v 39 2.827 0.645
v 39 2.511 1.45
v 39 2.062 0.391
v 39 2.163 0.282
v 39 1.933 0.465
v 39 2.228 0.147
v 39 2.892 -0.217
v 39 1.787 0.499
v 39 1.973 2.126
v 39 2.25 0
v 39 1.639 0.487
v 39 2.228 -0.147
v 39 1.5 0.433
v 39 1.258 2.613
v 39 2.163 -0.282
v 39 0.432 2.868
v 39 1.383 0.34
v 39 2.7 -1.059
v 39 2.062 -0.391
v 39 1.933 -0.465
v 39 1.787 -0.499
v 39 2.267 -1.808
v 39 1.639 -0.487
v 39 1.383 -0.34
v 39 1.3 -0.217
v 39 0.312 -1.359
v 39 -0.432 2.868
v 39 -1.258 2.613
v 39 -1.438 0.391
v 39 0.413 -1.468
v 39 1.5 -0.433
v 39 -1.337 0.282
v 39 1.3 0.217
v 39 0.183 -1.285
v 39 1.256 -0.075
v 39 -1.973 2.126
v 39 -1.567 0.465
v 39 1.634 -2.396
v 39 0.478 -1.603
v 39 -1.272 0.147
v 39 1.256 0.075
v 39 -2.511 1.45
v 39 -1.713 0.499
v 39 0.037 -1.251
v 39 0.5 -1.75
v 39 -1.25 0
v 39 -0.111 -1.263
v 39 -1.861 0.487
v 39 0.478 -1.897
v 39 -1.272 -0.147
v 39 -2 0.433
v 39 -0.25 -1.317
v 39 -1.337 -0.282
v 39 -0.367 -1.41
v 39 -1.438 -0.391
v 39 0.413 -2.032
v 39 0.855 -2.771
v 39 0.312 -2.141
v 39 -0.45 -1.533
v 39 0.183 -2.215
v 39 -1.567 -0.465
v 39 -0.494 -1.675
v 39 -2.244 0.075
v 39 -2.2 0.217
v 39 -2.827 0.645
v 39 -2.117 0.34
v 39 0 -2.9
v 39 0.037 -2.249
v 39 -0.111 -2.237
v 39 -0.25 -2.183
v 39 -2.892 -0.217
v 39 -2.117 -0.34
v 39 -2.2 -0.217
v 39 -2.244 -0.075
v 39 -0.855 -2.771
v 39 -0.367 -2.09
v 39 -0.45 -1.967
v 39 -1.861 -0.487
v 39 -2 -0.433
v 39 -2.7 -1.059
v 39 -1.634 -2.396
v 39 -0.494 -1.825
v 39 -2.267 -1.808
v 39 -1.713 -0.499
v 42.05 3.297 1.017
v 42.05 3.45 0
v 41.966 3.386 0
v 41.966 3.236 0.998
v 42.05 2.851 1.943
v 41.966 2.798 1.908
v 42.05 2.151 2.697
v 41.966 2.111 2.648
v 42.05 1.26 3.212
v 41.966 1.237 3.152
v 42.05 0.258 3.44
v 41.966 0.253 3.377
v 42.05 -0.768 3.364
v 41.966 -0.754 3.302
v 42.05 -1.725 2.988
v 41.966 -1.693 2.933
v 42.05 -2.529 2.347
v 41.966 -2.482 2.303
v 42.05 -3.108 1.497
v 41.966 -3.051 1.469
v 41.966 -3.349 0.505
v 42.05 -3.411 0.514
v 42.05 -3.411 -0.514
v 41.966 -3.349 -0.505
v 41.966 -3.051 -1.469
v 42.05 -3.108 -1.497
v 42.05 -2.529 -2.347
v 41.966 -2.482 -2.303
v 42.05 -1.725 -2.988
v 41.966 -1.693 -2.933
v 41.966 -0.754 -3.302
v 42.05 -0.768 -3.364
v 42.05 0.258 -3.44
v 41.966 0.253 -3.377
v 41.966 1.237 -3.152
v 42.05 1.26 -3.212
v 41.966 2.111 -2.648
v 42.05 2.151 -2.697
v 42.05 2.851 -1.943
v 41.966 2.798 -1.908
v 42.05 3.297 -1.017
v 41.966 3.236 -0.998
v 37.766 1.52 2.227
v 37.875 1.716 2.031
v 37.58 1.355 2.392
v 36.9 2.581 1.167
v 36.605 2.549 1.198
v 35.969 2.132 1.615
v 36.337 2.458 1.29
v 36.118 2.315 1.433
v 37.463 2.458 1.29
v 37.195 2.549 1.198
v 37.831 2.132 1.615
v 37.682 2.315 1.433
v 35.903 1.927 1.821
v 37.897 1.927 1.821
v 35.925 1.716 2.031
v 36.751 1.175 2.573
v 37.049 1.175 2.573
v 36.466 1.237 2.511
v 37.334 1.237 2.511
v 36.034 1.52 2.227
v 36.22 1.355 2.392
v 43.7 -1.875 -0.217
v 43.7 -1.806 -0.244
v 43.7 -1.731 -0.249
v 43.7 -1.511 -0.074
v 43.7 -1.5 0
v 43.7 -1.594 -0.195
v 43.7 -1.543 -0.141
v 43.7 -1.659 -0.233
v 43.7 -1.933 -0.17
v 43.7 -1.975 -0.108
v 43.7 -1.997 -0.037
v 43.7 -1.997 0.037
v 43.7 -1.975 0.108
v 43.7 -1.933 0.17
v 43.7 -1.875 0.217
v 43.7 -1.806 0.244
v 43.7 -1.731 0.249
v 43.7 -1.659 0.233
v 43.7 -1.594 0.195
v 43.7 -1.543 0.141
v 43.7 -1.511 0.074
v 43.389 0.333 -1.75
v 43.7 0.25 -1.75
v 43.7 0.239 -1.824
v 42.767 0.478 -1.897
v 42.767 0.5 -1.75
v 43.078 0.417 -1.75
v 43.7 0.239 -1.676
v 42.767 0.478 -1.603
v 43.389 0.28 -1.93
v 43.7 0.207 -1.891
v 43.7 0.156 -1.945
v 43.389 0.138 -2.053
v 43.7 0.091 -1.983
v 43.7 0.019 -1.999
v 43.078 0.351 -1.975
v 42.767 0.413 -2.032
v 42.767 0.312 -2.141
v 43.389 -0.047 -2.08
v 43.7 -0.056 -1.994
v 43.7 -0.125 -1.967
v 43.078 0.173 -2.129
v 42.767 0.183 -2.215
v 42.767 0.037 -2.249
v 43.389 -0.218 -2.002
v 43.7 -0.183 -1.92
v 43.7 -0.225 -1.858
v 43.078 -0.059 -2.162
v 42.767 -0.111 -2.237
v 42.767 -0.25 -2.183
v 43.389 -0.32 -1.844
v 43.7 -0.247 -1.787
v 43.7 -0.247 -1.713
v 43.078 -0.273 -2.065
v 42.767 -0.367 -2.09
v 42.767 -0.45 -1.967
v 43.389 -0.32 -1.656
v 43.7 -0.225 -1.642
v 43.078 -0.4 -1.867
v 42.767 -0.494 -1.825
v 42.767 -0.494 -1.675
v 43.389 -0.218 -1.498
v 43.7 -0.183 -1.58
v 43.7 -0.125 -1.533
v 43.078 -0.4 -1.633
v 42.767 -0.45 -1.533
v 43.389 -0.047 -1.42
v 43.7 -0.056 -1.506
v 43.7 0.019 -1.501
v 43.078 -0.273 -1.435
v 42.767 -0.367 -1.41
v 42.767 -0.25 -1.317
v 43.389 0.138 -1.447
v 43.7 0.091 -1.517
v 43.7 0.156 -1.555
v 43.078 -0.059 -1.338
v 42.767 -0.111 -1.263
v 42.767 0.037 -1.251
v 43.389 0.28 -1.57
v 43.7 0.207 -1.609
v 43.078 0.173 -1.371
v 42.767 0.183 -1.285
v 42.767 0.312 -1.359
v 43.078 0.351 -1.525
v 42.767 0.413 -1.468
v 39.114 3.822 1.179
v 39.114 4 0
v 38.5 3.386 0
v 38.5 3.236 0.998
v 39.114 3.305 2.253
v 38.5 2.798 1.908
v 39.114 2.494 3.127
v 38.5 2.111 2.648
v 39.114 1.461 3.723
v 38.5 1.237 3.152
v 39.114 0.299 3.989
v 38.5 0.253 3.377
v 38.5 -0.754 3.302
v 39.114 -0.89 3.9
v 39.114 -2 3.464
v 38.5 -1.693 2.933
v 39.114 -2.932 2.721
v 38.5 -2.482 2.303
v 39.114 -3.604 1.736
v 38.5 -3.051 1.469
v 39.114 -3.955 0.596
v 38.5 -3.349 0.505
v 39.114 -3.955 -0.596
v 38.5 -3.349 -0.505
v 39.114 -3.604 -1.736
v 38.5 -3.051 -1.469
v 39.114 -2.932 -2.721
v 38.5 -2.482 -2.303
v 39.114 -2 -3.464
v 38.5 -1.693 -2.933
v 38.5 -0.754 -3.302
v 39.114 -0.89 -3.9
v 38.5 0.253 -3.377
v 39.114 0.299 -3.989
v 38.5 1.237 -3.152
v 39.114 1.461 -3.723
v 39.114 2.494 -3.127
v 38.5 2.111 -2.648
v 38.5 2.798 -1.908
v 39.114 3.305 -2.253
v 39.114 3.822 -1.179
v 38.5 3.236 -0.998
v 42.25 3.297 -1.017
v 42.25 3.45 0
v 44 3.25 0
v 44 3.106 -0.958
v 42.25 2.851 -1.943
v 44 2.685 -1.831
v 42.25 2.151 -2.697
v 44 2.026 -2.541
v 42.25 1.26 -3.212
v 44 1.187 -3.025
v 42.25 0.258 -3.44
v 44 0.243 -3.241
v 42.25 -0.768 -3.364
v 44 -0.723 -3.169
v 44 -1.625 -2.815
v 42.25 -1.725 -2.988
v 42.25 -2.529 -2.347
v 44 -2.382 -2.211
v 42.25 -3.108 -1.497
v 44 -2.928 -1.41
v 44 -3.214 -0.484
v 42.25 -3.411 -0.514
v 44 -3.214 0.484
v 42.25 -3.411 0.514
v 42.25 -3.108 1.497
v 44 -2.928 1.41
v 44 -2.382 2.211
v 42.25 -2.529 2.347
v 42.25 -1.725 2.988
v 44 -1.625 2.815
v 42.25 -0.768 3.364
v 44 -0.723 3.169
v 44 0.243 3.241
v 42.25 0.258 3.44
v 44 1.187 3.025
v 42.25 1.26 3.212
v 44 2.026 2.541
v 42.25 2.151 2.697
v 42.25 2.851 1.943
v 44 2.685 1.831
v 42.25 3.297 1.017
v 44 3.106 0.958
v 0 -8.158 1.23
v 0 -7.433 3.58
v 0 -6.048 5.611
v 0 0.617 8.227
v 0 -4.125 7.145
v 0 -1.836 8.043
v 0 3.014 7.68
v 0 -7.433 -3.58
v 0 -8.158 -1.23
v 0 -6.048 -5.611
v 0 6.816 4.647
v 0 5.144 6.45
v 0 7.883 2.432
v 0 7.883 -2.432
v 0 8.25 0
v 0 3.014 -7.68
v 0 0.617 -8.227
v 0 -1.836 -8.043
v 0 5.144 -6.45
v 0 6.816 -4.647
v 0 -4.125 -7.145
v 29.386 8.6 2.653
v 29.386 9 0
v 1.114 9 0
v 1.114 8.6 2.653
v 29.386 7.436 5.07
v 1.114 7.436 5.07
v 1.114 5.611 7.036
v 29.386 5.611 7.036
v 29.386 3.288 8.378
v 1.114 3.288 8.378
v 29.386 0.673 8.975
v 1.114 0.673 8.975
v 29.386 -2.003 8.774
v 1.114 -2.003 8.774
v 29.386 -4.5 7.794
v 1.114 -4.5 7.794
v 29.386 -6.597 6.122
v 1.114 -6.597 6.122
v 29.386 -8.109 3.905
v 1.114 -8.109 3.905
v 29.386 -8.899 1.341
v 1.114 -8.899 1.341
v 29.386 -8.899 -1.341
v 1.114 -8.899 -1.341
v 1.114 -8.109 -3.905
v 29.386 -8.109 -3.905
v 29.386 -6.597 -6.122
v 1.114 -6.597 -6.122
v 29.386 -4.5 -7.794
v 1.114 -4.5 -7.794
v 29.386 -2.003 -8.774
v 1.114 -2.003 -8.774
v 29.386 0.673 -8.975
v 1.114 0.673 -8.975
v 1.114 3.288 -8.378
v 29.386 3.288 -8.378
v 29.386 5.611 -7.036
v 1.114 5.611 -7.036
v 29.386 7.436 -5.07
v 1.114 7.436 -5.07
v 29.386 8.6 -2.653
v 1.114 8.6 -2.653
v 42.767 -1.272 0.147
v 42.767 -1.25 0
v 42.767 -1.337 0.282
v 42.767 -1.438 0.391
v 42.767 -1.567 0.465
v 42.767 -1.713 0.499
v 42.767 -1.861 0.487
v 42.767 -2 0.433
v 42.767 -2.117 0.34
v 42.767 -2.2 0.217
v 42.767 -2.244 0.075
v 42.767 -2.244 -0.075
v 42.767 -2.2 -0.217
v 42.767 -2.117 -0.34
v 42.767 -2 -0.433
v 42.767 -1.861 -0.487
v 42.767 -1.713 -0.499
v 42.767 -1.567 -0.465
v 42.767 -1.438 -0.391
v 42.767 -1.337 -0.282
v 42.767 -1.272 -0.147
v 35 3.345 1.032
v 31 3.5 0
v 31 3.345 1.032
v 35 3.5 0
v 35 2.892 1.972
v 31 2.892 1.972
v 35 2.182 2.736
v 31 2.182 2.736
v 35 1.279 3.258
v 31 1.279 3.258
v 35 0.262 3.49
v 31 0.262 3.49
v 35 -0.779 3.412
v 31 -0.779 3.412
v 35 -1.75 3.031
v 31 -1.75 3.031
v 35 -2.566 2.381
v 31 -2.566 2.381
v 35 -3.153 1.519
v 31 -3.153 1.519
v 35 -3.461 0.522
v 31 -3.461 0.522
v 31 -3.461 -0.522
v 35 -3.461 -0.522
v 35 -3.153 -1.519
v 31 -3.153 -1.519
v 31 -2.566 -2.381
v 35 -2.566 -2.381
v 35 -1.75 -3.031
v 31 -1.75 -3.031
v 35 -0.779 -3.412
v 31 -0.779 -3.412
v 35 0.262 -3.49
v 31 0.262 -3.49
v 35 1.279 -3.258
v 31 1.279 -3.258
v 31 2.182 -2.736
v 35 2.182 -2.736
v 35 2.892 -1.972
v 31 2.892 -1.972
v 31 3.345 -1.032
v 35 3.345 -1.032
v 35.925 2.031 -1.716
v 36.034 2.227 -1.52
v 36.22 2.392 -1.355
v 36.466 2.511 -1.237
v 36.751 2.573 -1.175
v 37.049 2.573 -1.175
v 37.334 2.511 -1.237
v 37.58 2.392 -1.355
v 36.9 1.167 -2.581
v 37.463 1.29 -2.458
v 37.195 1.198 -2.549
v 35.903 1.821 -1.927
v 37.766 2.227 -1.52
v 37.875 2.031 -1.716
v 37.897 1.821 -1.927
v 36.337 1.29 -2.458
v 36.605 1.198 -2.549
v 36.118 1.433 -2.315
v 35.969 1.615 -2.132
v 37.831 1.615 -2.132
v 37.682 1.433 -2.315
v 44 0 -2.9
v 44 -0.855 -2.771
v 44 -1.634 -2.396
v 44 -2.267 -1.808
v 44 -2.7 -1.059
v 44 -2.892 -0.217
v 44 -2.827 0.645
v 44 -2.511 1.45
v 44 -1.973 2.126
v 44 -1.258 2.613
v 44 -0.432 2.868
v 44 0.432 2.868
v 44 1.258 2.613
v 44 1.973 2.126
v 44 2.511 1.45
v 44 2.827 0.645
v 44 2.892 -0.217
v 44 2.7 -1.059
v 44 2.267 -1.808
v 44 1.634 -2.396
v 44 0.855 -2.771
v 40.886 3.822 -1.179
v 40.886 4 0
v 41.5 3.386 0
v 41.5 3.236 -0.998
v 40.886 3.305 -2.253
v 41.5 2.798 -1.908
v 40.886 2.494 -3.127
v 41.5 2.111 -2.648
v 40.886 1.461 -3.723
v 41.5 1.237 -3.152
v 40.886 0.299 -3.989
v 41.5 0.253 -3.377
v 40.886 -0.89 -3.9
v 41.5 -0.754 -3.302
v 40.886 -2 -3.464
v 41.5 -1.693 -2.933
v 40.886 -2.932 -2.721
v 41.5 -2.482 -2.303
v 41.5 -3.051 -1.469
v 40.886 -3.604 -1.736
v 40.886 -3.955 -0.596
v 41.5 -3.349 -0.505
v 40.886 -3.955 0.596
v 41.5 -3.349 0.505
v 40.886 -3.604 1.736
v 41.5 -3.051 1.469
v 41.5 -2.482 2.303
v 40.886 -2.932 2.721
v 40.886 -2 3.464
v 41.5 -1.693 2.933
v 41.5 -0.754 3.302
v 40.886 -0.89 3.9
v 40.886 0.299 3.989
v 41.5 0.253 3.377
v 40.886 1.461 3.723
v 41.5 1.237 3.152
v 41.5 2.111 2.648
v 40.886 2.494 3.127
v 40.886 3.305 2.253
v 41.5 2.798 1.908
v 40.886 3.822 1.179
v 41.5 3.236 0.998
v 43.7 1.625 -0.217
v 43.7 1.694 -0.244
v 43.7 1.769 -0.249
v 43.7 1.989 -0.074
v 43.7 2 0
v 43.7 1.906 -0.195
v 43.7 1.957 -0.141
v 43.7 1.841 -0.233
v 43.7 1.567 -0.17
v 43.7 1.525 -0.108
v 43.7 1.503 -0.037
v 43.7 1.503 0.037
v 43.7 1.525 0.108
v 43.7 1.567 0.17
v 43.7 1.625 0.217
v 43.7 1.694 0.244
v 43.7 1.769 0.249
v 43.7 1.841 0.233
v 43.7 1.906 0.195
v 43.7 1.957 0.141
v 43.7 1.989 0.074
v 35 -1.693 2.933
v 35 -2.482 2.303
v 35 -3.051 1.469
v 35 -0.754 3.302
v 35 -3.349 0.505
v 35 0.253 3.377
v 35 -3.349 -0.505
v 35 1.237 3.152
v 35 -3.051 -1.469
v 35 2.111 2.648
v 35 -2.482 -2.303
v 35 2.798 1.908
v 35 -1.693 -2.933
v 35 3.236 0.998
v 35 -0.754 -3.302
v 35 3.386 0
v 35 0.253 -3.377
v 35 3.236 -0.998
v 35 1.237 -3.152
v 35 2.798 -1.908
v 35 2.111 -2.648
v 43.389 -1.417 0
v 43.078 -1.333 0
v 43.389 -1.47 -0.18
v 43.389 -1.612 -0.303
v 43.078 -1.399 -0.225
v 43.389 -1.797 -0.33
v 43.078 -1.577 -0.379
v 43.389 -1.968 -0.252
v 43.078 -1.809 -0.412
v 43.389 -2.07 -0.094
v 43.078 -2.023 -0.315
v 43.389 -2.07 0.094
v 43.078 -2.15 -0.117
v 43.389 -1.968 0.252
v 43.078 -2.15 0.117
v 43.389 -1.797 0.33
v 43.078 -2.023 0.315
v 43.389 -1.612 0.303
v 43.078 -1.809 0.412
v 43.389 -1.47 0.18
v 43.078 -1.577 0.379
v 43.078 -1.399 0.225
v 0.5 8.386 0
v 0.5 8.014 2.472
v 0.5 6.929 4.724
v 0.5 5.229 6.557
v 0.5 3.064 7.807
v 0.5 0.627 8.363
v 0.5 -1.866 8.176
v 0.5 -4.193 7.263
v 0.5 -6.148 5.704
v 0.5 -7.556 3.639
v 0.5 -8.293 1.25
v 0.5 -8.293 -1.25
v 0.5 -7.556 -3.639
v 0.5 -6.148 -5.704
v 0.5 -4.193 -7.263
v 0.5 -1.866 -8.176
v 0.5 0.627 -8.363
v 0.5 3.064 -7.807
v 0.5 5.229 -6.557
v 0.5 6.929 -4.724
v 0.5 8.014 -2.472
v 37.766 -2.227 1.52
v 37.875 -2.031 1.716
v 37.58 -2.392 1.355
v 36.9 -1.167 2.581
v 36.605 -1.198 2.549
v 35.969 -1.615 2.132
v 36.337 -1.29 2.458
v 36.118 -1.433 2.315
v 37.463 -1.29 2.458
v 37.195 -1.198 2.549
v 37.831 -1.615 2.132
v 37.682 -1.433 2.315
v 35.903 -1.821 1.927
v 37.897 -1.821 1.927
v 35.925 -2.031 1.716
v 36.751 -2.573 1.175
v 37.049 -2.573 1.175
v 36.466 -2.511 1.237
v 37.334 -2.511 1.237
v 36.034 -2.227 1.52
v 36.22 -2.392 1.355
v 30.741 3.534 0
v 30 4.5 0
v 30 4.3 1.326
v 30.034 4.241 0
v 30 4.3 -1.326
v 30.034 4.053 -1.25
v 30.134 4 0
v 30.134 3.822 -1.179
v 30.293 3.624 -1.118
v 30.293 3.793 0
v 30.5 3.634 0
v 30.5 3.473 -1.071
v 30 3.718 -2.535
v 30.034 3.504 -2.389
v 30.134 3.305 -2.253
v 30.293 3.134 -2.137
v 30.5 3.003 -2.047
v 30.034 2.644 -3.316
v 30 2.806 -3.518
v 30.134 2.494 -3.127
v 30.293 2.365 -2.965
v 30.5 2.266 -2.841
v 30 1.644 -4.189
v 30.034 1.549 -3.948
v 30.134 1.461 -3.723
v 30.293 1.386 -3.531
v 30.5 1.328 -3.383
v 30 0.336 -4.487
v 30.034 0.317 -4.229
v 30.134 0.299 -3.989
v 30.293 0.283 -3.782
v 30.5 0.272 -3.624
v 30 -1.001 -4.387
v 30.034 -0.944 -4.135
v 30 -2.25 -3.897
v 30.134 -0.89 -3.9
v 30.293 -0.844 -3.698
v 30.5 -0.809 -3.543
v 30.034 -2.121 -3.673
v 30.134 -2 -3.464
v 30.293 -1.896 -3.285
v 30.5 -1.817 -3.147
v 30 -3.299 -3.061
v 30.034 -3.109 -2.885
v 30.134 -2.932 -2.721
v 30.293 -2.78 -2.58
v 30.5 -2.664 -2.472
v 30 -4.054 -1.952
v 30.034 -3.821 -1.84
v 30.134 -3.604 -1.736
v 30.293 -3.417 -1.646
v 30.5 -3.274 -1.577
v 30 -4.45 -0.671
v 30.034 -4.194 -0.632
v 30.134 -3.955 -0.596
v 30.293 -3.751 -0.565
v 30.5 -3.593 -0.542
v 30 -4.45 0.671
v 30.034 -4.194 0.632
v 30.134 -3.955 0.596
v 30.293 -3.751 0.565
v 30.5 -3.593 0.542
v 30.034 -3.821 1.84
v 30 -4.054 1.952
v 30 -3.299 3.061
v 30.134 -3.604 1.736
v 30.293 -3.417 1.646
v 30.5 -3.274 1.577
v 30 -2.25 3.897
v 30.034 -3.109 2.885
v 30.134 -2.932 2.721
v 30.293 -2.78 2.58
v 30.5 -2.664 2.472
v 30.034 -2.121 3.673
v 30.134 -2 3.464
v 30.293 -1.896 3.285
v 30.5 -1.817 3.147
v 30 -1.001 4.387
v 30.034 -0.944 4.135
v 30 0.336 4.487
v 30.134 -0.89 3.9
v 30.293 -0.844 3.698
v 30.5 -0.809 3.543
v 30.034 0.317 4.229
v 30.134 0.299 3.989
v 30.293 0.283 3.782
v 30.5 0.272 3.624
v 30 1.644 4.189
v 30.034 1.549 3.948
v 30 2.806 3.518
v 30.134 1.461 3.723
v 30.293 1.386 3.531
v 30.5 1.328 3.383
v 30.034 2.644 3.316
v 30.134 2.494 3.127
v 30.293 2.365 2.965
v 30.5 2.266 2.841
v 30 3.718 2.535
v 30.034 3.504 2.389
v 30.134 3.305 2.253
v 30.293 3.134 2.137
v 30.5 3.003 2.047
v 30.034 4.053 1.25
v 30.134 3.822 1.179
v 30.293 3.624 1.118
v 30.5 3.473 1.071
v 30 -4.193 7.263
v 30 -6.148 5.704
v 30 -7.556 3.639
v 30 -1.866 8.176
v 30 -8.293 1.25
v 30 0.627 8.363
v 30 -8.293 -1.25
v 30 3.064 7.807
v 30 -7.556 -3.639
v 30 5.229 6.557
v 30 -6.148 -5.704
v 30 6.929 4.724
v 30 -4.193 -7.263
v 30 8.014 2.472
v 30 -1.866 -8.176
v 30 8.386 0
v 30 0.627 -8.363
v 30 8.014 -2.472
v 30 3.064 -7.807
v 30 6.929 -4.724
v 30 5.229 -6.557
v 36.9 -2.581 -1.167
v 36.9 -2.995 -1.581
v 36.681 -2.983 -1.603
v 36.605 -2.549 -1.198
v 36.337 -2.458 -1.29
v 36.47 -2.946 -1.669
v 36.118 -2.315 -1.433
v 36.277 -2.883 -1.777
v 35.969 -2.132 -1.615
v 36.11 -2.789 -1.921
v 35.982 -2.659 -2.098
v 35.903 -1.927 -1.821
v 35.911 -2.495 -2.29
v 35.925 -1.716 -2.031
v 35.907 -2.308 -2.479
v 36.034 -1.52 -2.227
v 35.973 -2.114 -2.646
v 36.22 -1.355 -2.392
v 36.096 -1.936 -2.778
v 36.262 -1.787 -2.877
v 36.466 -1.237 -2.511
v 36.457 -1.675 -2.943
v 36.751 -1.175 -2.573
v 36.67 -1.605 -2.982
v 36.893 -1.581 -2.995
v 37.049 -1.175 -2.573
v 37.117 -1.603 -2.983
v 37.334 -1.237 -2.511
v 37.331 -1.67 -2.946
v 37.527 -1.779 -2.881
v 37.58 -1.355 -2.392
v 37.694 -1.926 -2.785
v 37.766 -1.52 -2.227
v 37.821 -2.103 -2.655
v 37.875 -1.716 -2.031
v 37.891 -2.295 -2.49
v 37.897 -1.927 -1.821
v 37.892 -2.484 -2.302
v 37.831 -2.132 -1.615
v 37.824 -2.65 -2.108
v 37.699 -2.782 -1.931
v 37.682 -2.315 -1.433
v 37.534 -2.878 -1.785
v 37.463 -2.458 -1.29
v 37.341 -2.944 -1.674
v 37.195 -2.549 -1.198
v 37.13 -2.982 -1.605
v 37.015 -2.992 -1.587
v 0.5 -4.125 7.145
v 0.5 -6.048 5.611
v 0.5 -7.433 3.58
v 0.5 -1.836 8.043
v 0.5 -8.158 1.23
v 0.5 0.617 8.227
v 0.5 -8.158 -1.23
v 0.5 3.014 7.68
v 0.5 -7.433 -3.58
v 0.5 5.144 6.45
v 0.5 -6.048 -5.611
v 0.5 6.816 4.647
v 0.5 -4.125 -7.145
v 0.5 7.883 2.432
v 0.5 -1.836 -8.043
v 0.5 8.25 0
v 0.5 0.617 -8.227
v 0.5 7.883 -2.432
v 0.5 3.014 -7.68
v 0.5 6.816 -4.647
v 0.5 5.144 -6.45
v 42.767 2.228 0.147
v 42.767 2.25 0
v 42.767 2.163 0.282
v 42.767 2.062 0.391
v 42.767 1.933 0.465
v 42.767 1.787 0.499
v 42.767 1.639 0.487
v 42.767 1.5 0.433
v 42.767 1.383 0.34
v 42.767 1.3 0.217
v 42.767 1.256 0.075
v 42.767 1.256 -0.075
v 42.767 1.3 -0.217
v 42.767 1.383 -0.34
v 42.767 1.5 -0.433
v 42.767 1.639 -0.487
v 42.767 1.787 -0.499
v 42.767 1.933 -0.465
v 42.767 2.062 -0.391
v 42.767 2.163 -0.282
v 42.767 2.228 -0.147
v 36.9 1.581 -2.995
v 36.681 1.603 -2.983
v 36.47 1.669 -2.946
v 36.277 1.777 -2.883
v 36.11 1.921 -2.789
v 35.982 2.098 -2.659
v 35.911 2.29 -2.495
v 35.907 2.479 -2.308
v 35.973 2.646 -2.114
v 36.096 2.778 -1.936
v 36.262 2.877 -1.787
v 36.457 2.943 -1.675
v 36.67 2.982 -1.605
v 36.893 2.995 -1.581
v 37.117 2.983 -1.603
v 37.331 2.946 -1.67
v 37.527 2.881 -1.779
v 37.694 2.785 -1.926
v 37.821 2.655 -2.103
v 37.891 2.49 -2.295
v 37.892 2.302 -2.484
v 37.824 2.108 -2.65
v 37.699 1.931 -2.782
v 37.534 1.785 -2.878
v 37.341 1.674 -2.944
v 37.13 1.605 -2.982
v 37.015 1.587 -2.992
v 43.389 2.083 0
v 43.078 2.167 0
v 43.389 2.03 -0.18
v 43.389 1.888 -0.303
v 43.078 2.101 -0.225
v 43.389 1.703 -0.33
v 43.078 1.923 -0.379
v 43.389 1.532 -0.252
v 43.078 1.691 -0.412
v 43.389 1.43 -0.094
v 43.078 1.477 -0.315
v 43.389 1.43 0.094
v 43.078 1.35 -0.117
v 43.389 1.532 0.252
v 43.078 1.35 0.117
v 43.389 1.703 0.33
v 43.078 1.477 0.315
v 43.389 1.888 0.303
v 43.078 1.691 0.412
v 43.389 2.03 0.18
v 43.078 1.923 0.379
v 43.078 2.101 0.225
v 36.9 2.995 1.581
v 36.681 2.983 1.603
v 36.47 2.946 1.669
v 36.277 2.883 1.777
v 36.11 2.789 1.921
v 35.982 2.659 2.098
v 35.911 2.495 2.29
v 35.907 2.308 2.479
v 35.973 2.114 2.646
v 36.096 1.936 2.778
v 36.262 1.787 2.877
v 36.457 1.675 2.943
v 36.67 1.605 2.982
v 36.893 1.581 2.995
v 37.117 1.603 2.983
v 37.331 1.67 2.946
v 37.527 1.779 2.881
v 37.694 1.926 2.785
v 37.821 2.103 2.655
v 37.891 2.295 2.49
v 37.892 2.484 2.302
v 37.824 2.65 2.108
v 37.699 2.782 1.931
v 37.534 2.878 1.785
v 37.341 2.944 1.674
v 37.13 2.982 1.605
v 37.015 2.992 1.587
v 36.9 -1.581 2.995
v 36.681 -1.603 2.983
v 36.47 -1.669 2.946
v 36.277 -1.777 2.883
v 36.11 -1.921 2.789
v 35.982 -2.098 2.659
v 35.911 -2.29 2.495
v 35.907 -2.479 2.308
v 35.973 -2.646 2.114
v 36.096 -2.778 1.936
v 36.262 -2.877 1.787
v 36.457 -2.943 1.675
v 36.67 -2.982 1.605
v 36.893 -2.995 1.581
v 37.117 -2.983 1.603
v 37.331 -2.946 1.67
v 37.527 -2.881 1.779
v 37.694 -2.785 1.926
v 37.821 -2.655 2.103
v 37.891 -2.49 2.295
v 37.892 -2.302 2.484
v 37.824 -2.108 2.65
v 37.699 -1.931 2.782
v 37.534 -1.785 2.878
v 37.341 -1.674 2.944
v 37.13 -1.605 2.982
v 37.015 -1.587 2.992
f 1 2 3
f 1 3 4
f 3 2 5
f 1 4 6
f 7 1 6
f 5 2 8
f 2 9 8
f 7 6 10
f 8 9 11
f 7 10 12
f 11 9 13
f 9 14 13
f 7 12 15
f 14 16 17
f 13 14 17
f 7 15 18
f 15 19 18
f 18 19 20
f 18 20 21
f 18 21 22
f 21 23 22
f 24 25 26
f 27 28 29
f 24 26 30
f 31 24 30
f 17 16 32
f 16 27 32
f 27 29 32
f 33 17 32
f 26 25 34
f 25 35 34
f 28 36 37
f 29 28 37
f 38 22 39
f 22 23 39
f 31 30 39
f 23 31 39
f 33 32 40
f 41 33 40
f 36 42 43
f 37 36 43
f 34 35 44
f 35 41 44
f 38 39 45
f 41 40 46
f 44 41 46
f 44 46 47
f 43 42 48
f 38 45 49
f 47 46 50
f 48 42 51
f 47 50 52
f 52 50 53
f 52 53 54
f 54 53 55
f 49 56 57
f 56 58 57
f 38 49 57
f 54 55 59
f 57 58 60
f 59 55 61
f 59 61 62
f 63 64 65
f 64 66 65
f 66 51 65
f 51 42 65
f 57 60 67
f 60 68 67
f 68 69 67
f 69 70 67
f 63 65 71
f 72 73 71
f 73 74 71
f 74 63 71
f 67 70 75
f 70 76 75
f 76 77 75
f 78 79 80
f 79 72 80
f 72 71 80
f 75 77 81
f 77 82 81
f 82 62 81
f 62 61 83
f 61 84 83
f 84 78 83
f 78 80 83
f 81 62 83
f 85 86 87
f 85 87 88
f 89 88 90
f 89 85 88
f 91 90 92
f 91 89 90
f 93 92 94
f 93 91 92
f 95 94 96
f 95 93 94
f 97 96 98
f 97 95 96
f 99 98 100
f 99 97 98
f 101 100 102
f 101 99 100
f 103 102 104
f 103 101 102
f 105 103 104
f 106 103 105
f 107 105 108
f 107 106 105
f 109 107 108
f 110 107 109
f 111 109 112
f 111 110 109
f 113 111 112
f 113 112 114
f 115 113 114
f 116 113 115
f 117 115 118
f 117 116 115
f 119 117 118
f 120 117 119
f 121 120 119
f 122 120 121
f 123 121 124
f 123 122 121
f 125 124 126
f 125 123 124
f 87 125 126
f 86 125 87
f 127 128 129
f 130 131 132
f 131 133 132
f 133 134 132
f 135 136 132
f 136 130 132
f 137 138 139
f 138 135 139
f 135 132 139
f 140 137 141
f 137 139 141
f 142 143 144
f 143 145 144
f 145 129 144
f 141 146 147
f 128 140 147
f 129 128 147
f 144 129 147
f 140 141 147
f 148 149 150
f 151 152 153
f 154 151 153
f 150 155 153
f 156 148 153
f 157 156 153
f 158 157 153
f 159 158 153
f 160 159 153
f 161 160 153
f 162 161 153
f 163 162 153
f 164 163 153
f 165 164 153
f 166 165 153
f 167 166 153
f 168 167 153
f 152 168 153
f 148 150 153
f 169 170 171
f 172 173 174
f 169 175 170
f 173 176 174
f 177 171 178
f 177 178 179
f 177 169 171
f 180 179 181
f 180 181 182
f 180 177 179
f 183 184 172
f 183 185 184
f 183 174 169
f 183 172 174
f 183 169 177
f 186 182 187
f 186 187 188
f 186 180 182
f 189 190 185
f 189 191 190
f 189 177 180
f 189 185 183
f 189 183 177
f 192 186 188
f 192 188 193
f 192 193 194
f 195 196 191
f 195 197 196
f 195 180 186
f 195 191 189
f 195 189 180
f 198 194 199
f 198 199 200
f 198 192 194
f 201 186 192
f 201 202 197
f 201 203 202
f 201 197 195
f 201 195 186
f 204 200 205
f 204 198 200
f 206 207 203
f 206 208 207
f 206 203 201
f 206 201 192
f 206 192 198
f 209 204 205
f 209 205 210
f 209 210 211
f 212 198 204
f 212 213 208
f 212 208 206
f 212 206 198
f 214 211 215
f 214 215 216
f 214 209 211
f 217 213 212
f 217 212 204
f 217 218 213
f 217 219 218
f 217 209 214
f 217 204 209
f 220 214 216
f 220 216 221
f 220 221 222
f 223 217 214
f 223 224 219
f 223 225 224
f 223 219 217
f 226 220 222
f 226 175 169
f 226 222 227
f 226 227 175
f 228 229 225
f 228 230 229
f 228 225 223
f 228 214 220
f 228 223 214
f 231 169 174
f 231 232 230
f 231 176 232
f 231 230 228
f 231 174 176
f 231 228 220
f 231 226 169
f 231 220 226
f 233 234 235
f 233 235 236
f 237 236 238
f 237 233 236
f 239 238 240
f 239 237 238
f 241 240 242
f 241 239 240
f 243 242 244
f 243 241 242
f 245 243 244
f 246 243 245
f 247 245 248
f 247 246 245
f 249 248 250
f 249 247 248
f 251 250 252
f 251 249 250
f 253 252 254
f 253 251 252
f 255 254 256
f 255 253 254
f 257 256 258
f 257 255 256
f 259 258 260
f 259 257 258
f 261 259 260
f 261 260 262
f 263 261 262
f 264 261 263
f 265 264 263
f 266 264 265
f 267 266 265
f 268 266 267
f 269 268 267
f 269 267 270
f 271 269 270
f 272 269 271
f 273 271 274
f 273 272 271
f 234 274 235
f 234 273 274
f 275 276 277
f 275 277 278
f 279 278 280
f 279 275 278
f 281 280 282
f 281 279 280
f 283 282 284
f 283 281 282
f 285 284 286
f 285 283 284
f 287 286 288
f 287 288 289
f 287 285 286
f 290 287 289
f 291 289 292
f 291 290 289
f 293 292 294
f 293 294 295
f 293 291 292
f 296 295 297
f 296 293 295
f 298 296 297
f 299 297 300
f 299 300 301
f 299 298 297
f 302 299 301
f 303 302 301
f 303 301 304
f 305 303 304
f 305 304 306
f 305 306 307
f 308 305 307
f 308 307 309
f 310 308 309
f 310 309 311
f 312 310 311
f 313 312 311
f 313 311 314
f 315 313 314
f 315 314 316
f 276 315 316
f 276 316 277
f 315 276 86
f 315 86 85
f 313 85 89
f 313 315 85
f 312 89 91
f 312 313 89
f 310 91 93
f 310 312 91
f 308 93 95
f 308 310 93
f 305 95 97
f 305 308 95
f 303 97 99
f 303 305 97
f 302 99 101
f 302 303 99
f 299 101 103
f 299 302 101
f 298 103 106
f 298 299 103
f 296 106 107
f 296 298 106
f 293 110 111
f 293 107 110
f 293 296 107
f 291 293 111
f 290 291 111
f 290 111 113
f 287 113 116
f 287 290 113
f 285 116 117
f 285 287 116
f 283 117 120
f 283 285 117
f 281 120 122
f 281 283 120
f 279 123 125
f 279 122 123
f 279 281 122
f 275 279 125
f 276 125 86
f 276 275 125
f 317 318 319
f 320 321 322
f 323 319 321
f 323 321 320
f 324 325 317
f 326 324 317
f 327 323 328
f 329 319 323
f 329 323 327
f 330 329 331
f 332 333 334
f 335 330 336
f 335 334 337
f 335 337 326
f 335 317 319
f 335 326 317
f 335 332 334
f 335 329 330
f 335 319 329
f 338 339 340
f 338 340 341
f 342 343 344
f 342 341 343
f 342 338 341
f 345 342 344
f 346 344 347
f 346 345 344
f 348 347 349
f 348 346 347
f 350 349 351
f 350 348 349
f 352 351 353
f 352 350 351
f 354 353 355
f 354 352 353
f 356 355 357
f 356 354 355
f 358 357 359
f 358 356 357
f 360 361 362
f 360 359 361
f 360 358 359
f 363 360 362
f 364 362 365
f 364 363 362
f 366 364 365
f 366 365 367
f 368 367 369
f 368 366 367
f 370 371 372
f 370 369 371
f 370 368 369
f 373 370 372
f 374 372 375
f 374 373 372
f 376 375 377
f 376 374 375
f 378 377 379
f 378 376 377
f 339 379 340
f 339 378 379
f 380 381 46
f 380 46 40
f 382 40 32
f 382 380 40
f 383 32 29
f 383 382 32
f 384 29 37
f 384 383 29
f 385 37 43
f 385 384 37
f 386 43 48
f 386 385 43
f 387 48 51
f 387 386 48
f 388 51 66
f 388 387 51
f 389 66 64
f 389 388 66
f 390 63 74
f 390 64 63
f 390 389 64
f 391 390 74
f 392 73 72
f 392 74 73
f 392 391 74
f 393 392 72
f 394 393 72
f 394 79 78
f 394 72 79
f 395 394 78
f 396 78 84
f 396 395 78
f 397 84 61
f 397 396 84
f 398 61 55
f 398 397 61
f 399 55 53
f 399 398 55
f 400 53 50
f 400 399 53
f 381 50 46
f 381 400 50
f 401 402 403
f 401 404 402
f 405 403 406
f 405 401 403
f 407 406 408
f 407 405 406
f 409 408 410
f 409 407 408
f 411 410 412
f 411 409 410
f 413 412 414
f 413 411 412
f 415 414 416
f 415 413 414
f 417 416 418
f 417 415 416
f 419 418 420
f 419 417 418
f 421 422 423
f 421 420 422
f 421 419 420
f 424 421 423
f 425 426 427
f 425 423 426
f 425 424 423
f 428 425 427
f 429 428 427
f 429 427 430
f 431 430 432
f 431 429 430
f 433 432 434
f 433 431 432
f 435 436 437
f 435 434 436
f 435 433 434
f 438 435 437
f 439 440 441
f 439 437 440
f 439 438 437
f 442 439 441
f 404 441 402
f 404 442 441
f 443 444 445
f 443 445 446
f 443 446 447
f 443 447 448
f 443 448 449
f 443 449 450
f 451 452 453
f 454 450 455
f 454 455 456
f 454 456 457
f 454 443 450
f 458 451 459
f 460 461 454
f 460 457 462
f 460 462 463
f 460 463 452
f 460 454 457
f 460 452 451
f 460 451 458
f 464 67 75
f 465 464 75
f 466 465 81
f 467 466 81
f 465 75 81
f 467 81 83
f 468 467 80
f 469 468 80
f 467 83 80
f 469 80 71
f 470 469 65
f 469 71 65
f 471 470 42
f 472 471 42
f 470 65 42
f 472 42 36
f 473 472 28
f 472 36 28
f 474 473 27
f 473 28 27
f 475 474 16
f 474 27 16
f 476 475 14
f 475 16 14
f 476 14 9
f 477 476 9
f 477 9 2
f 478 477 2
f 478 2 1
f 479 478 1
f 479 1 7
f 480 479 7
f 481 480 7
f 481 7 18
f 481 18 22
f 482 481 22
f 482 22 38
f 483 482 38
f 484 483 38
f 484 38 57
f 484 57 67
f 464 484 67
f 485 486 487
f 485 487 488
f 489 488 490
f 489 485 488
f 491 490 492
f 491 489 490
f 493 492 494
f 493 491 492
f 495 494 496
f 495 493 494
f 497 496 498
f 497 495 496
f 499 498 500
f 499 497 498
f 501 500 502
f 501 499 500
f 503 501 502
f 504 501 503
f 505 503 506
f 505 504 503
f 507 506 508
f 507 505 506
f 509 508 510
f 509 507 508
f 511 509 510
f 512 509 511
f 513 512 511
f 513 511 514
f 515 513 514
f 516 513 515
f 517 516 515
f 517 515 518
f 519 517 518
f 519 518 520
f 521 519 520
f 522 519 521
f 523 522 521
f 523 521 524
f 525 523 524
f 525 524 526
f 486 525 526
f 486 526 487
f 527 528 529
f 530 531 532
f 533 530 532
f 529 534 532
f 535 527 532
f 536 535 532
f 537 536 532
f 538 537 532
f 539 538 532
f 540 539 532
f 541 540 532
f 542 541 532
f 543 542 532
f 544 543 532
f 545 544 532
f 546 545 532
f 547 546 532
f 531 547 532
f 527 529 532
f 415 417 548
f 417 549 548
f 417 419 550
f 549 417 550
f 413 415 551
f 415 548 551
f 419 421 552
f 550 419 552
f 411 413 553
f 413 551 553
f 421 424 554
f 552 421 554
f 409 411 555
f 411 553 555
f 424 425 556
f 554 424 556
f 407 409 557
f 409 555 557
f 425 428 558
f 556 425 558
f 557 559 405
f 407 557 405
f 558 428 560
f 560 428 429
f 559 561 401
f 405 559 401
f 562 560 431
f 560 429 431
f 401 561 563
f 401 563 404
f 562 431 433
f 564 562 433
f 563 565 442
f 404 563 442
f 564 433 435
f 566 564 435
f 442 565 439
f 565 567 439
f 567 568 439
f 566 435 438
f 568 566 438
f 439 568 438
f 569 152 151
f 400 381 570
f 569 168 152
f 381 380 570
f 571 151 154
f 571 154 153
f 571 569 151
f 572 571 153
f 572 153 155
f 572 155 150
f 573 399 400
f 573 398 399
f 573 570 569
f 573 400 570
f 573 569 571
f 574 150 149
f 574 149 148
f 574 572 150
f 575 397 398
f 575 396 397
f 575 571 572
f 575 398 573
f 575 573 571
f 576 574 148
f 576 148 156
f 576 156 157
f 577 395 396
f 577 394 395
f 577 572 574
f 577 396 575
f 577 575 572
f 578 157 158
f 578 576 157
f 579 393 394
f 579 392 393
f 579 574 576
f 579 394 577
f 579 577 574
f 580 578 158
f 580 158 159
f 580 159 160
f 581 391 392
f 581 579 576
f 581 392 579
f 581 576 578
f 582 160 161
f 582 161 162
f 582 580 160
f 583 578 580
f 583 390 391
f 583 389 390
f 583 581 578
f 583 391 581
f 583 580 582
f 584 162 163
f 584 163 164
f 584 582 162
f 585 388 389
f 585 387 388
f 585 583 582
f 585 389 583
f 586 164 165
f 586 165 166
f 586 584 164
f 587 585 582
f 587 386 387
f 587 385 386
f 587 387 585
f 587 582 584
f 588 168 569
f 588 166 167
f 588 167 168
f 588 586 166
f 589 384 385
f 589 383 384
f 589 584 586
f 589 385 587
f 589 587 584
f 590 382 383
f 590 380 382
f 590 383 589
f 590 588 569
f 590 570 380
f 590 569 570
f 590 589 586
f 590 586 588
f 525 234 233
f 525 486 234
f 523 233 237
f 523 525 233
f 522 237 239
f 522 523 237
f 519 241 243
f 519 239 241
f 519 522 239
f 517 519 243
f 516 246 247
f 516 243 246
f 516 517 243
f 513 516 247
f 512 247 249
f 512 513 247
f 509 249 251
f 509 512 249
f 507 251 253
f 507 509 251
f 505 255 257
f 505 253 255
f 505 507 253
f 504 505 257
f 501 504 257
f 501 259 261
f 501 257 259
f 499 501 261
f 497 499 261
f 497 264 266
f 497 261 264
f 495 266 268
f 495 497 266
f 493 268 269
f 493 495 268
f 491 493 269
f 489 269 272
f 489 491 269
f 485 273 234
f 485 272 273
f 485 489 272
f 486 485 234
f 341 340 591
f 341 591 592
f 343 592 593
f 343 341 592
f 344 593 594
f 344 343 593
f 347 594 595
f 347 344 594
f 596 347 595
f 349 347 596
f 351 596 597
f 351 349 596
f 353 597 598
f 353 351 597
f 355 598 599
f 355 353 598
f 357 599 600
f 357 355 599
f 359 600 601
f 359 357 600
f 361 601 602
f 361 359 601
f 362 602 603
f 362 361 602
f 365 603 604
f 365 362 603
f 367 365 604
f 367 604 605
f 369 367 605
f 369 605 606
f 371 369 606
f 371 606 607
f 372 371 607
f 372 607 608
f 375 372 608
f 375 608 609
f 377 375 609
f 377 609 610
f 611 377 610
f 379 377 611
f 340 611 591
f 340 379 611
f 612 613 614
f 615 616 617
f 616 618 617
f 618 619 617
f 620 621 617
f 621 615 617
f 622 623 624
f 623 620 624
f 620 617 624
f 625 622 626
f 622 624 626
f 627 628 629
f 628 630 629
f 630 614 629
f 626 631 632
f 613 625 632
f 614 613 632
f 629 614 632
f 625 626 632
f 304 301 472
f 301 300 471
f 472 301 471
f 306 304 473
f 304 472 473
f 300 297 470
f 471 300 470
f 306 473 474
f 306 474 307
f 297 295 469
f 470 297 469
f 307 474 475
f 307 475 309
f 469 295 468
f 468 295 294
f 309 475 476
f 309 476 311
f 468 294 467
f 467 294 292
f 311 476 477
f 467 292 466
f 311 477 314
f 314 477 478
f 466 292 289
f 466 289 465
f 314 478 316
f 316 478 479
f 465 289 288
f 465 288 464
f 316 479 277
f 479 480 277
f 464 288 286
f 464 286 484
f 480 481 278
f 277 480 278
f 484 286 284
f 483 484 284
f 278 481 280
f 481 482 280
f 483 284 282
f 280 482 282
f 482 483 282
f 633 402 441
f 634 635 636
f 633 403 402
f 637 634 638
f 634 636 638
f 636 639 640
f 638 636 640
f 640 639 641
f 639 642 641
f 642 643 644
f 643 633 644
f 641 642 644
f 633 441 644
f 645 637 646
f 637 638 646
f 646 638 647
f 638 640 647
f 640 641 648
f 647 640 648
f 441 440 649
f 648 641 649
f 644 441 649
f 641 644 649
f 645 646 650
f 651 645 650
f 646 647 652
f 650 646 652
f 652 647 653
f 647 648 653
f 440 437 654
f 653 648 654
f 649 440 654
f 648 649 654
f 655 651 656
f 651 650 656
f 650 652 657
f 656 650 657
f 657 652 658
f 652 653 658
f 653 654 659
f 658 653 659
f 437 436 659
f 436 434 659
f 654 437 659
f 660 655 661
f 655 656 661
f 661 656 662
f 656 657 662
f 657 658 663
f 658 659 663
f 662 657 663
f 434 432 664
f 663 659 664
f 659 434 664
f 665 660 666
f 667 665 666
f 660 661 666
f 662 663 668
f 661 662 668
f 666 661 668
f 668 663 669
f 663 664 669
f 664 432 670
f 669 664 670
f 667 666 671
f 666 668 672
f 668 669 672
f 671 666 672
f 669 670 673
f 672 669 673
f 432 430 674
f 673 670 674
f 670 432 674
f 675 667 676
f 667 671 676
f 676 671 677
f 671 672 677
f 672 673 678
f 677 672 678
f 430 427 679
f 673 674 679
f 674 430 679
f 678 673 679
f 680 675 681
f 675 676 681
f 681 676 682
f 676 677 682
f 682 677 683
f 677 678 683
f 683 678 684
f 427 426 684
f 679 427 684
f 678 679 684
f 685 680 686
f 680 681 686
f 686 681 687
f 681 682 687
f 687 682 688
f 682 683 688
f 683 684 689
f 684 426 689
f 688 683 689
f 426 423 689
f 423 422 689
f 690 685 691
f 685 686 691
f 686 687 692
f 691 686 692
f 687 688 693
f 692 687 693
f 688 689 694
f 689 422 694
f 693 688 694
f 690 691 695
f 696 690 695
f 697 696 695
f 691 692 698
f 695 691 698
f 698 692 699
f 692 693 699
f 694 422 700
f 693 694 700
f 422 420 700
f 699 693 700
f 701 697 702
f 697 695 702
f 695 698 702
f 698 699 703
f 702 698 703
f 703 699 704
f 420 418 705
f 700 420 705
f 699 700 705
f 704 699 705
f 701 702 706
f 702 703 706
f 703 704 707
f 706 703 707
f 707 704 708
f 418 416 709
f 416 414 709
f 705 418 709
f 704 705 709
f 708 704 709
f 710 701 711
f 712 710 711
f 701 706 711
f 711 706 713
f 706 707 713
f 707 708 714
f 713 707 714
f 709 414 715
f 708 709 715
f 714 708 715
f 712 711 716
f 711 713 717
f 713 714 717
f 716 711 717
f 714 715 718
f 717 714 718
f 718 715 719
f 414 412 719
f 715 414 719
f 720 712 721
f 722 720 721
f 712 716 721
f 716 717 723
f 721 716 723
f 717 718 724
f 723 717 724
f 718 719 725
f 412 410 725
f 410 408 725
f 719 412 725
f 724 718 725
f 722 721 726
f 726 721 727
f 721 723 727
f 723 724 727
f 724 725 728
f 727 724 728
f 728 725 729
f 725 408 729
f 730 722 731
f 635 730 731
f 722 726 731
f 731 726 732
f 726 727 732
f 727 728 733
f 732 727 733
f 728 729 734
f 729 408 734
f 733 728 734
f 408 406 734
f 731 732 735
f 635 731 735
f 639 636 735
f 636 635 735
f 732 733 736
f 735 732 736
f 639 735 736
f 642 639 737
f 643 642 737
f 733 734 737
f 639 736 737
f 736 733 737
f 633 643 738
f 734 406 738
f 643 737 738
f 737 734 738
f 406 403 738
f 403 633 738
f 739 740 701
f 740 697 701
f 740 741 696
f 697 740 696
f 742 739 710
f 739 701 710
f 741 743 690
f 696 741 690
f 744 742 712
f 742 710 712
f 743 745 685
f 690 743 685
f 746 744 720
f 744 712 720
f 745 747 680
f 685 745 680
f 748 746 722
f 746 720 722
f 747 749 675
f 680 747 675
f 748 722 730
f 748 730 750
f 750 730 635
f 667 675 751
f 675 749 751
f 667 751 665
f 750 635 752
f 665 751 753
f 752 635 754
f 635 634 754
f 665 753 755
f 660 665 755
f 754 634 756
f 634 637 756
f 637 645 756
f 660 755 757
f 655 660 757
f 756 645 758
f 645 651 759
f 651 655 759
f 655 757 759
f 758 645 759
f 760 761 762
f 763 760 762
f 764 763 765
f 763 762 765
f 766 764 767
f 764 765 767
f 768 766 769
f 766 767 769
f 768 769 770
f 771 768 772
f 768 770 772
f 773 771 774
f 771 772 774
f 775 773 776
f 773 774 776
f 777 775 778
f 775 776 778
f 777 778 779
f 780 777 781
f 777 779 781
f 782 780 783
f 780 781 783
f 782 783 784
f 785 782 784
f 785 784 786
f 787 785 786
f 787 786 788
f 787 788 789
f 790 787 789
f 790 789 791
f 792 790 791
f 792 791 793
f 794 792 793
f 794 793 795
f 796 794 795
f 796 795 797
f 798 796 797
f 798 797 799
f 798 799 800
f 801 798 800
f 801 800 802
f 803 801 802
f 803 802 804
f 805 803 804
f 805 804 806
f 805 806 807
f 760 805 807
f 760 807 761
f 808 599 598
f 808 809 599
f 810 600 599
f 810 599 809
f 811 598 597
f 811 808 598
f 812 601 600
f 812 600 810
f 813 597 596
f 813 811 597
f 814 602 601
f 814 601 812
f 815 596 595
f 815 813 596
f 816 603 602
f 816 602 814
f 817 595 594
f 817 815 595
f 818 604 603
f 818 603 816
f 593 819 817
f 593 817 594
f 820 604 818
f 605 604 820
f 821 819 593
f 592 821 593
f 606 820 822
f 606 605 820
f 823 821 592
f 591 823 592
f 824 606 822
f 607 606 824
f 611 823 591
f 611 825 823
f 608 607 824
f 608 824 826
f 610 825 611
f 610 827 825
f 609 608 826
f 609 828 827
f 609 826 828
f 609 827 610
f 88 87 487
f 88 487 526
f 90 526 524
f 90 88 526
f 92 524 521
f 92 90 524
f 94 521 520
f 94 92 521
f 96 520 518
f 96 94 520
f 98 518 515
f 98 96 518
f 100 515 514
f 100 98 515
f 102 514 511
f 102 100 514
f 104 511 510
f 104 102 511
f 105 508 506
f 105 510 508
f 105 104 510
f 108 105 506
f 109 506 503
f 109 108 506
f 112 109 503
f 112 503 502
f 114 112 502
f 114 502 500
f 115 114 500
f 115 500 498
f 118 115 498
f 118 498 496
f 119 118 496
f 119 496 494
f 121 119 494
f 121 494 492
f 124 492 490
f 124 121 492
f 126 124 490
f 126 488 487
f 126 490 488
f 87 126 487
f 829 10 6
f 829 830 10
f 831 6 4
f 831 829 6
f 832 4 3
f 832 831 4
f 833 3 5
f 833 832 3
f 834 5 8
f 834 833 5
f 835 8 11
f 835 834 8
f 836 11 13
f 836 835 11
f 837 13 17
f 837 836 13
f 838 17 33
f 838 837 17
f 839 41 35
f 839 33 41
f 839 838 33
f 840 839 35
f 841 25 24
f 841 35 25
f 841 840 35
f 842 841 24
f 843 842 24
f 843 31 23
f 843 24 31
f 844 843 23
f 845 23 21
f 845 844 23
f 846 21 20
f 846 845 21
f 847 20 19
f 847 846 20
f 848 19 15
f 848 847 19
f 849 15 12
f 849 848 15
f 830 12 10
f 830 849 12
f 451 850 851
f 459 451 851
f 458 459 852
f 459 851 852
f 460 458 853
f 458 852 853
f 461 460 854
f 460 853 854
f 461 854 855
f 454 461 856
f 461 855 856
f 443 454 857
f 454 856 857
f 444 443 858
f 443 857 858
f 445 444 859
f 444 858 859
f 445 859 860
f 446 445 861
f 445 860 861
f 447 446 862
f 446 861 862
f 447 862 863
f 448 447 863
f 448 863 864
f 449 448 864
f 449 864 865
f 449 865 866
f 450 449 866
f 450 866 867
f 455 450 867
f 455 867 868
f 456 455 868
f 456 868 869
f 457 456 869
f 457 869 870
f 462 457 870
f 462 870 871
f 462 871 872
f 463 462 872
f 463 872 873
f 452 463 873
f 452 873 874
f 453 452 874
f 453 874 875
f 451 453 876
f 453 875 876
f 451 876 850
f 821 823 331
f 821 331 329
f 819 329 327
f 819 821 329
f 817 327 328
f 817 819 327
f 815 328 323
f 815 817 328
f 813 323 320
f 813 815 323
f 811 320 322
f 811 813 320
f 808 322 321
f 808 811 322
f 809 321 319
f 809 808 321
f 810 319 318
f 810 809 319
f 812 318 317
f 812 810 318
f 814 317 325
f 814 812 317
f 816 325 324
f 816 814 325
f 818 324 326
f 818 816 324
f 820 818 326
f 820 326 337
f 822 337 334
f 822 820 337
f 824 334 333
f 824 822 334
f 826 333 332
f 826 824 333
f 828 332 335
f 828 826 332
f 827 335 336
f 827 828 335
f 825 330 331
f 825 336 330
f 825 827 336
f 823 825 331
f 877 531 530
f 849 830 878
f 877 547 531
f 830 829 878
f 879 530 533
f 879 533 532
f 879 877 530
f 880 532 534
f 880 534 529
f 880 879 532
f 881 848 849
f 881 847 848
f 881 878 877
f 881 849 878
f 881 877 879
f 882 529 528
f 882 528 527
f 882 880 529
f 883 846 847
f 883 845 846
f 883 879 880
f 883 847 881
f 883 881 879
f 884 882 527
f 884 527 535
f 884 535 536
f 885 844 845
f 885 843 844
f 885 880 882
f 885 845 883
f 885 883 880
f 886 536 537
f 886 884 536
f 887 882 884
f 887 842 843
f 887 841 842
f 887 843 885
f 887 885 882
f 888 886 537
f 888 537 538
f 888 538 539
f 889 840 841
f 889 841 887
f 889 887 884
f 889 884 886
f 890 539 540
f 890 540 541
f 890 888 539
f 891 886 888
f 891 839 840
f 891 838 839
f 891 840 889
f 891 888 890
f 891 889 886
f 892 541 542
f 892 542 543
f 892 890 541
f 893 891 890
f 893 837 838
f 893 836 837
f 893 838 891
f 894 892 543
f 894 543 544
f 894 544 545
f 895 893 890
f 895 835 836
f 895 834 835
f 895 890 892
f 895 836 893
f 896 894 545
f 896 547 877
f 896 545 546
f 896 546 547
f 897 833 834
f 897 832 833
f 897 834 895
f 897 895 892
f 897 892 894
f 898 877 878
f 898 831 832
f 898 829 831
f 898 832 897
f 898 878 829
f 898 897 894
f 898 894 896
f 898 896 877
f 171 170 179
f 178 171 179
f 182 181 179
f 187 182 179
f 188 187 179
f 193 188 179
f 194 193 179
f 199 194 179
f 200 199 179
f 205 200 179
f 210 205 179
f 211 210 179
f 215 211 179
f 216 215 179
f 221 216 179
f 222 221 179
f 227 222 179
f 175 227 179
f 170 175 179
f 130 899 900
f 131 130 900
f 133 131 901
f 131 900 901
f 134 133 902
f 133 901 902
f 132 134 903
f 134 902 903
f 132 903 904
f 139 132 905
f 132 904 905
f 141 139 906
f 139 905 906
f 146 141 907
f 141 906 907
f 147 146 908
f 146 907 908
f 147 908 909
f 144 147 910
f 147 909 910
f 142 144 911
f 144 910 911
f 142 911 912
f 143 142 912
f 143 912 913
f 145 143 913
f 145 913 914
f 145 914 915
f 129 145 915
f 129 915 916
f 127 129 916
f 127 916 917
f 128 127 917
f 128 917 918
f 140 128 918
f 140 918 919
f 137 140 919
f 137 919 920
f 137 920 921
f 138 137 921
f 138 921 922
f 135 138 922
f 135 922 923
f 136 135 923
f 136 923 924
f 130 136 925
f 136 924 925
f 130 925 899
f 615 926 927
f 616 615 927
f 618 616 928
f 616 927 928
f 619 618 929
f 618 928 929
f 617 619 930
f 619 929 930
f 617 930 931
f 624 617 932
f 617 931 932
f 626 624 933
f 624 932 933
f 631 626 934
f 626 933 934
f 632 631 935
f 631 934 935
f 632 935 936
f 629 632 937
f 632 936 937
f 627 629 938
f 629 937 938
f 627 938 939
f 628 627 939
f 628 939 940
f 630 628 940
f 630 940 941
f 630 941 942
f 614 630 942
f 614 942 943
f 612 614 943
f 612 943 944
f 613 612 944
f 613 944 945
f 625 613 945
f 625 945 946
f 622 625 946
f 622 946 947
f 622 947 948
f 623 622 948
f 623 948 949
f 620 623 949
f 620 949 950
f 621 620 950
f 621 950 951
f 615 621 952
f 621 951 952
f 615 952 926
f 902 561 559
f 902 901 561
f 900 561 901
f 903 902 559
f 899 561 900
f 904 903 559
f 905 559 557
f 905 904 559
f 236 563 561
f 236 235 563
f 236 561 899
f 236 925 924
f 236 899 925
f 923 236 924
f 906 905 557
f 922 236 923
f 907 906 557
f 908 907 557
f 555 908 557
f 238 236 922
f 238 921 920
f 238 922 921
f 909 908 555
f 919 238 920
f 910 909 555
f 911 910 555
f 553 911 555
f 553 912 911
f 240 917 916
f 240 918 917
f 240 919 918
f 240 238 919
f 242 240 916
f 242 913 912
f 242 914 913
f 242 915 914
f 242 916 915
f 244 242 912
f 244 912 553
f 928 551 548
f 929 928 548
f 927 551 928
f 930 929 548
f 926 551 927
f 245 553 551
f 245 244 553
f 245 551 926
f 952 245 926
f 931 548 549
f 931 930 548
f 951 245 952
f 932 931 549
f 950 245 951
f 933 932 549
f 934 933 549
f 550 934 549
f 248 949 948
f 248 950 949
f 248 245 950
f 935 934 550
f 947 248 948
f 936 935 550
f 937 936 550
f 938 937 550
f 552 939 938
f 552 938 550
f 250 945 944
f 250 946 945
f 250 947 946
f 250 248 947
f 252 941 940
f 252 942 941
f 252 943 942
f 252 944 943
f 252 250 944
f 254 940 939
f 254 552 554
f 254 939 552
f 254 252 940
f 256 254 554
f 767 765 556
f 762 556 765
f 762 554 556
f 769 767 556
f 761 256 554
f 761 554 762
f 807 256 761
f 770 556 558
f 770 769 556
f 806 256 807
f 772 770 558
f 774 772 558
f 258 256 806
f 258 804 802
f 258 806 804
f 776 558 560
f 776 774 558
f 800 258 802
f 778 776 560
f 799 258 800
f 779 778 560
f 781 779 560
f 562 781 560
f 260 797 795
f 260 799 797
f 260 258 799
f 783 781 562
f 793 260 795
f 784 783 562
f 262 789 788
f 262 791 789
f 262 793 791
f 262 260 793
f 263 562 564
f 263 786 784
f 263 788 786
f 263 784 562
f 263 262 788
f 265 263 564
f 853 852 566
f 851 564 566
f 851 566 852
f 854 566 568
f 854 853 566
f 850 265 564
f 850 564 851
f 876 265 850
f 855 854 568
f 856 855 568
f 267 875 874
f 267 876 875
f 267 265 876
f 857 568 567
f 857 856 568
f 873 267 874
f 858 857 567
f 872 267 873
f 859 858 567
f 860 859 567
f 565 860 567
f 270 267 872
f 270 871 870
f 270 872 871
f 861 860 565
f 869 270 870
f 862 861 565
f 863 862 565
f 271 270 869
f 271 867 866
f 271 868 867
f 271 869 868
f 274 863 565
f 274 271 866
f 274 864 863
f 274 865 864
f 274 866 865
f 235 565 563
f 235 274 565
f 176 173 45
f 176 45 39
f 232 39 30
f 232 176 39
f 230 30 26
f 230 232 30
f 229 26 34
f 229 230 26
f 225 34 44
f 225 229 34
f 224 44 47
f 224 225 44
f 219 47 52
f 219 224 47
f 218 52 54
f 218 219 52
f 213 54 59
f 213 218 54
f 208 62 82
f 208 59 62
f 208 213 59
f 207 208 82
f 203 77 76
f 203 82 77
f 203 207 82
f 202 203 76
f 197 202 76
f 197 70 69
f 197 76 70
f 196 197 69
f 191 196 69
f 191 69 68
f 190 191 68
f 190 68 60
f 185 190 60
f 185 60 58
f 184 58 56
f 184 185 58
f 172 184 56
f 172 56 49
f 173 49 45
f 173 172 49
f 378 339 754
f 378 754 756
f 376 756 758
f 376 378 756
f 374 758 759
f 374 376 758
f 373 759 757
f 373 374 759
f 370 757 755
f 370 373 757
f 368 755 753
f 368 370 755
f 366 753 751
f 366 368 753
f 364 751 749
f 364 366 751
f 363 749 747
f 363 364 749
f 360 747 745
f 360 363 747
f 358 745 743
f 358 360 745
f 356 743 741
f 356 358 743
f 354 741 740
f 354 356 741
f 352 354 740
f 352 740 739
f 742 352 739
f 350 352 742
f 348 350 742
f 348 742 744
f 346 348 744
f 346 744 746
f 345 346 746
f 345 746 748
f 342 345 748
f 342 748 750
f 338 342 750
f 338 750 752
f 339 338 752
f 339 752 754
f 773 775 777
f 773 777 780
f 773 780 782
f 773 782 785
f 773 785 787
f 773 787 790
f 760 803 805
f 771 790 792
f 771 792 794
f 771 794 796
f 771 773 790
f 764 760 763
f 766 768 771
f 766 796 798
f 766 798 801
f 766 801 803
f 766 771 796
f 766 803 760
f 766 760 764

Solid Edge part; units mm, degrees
sketch "Sketch1" plane through (0, 0, 0) normal (0, 0, 1) x (1, 0, 0)
  line L0 (0, 0) -> (0, 8.25)
  line L1 (0, 8.25) -> (0.5, 8.25)
  line L2 (0.5, 8.25) -> (0.5, 8.3865)
  line L3 (0.5, 8.3865) -> (1.1135, 9)
  line L4 (1.1135, 9) -> (29.3865, 9)
  line L5 (29.3865, 9) -> (30, 8.3865)
  line L6 (30, 8.3865) -> (30, 4.5)
  arc A0 (30, 4.5) -> (31, 3.5) centre (31, 4.5) ccw
  line L7 (31, 3.5) -> (35, 3.5)
  line L8 (35, 3.5) -> (35, 3.3865)
  line L9 (35, 3.3865) -> (38.5, 3.3865)
  line L10 (38.5, 3.3865) -> (39.1135, 4)
  line L11 (39.1135, 4) -> (40.8865, 4)
  line L12 (40.8865, 4) -> (41.5, 3.3865)
  line L13 (41.5, 3.3865) -> (41.9657, 3.3865)
  line L14 (41.9657, 3.3865) -> (42.05, 3.45)
  line L15 (42.05, 3.45) -> (42.25, 3.45)
  line L16 (42.25, 3.45) -> (44, 3.25)
  line L17 (44, 3.25) -> (44, 0)
  line L18 (44, 0) -> (0, 0)
revolve "RevolvedProtrusion1" add sketch "Sketch1" angle 360 about axis through (44, 0, 0) along (-1, 0, 0)
cosmetic_thread "Thread1" size "M8 x 1"
hole "Bohrung_1" at (44, 0, 0) direction (-1, 0, 0) diameter 5.8 depth 5
hole "Bohrung_2" at (36.9, 1.8738, 1.8738) direction (0, 0.7071, 0.7071) diameter 2 depth 0.75
hole "Bohrung_3" at (36.9, -1.8738, 1.8738) direction (0, -0.7071, 0.7071) diameter 2 depth 0.75
hole "Bohrung_4" at (36.9, -1.8738, -1.8738) direction (0, -0.7071, -0.7071) diameter 2 depth 0.75
hole "Bohrung_5" at (36.9, 1.8738, -1.8738) direction (0, 0.7071, -0.7071) diameter 2 depth 0.75
sketch "Sketch2" plane through (0, 0, 0) normal (0, 0, 1) x (1, 0, 0)
  line L0 (39, 1.75) -> (39, 2.25)
  line L1 (39, 2.25) -> (42.767, 2.25)
  line L2 (42.767, 2.25) -> (43.7, 2)
  line L3 (43.7, 2) -> (43.7, 1.75)
  line L4 (43.7, 1.75) -> (39, 1.75)
revolve "RevolvedProtrusion2" add sketch "Sketch2" angle 360 about axis through (43.7, 1.75, 0) along (-1, 0, 0)
sketch "Sketch3" plane through (0, 0, 0) normal (0, 0, 1) x (1, 0, 0)
  line L0 (39, -1.75) -> (39, -1.25)
  line L1 (39, -1.25) -> (42.767, -1.25)
  line L2 (42.767, -1.25) -> (43.7, -1.5)
  line L3 (43.7, -1.5) -> (43.7, -1.75)
  line L4 (43.7, -1.75) -> (39, -1.75)
revolve "RevolvedProtrusion3" add sketch "Sketch3" angle 360 about axis through (43.7, -1.75, 0) along (-1, 0, 0)
sketch "Sketch4" plane through (0, 0, -1.75) normal (0, 0, 1) x (1, 0, 0)
  line L0 (39, 0) -> (39, 0.5)
  line L1 (39, 0.5) -> (42.767, 0.5)
  line L2 (42.767, 0.5) -> (43.7, 0.25)
  line L3 (43.7, 0.25) -> (43.7, 0)
  line L4 (43.7, 0) -> (39, 0)
revolve "RevolvedProtrusion4" add sketch "Sketch4" angle 360 about axis through (43.7, 0, -1.75) along (-1, 0, 0)
properties part number "BALLUFF BES 516-326-G-E5-Y-S49_1"
